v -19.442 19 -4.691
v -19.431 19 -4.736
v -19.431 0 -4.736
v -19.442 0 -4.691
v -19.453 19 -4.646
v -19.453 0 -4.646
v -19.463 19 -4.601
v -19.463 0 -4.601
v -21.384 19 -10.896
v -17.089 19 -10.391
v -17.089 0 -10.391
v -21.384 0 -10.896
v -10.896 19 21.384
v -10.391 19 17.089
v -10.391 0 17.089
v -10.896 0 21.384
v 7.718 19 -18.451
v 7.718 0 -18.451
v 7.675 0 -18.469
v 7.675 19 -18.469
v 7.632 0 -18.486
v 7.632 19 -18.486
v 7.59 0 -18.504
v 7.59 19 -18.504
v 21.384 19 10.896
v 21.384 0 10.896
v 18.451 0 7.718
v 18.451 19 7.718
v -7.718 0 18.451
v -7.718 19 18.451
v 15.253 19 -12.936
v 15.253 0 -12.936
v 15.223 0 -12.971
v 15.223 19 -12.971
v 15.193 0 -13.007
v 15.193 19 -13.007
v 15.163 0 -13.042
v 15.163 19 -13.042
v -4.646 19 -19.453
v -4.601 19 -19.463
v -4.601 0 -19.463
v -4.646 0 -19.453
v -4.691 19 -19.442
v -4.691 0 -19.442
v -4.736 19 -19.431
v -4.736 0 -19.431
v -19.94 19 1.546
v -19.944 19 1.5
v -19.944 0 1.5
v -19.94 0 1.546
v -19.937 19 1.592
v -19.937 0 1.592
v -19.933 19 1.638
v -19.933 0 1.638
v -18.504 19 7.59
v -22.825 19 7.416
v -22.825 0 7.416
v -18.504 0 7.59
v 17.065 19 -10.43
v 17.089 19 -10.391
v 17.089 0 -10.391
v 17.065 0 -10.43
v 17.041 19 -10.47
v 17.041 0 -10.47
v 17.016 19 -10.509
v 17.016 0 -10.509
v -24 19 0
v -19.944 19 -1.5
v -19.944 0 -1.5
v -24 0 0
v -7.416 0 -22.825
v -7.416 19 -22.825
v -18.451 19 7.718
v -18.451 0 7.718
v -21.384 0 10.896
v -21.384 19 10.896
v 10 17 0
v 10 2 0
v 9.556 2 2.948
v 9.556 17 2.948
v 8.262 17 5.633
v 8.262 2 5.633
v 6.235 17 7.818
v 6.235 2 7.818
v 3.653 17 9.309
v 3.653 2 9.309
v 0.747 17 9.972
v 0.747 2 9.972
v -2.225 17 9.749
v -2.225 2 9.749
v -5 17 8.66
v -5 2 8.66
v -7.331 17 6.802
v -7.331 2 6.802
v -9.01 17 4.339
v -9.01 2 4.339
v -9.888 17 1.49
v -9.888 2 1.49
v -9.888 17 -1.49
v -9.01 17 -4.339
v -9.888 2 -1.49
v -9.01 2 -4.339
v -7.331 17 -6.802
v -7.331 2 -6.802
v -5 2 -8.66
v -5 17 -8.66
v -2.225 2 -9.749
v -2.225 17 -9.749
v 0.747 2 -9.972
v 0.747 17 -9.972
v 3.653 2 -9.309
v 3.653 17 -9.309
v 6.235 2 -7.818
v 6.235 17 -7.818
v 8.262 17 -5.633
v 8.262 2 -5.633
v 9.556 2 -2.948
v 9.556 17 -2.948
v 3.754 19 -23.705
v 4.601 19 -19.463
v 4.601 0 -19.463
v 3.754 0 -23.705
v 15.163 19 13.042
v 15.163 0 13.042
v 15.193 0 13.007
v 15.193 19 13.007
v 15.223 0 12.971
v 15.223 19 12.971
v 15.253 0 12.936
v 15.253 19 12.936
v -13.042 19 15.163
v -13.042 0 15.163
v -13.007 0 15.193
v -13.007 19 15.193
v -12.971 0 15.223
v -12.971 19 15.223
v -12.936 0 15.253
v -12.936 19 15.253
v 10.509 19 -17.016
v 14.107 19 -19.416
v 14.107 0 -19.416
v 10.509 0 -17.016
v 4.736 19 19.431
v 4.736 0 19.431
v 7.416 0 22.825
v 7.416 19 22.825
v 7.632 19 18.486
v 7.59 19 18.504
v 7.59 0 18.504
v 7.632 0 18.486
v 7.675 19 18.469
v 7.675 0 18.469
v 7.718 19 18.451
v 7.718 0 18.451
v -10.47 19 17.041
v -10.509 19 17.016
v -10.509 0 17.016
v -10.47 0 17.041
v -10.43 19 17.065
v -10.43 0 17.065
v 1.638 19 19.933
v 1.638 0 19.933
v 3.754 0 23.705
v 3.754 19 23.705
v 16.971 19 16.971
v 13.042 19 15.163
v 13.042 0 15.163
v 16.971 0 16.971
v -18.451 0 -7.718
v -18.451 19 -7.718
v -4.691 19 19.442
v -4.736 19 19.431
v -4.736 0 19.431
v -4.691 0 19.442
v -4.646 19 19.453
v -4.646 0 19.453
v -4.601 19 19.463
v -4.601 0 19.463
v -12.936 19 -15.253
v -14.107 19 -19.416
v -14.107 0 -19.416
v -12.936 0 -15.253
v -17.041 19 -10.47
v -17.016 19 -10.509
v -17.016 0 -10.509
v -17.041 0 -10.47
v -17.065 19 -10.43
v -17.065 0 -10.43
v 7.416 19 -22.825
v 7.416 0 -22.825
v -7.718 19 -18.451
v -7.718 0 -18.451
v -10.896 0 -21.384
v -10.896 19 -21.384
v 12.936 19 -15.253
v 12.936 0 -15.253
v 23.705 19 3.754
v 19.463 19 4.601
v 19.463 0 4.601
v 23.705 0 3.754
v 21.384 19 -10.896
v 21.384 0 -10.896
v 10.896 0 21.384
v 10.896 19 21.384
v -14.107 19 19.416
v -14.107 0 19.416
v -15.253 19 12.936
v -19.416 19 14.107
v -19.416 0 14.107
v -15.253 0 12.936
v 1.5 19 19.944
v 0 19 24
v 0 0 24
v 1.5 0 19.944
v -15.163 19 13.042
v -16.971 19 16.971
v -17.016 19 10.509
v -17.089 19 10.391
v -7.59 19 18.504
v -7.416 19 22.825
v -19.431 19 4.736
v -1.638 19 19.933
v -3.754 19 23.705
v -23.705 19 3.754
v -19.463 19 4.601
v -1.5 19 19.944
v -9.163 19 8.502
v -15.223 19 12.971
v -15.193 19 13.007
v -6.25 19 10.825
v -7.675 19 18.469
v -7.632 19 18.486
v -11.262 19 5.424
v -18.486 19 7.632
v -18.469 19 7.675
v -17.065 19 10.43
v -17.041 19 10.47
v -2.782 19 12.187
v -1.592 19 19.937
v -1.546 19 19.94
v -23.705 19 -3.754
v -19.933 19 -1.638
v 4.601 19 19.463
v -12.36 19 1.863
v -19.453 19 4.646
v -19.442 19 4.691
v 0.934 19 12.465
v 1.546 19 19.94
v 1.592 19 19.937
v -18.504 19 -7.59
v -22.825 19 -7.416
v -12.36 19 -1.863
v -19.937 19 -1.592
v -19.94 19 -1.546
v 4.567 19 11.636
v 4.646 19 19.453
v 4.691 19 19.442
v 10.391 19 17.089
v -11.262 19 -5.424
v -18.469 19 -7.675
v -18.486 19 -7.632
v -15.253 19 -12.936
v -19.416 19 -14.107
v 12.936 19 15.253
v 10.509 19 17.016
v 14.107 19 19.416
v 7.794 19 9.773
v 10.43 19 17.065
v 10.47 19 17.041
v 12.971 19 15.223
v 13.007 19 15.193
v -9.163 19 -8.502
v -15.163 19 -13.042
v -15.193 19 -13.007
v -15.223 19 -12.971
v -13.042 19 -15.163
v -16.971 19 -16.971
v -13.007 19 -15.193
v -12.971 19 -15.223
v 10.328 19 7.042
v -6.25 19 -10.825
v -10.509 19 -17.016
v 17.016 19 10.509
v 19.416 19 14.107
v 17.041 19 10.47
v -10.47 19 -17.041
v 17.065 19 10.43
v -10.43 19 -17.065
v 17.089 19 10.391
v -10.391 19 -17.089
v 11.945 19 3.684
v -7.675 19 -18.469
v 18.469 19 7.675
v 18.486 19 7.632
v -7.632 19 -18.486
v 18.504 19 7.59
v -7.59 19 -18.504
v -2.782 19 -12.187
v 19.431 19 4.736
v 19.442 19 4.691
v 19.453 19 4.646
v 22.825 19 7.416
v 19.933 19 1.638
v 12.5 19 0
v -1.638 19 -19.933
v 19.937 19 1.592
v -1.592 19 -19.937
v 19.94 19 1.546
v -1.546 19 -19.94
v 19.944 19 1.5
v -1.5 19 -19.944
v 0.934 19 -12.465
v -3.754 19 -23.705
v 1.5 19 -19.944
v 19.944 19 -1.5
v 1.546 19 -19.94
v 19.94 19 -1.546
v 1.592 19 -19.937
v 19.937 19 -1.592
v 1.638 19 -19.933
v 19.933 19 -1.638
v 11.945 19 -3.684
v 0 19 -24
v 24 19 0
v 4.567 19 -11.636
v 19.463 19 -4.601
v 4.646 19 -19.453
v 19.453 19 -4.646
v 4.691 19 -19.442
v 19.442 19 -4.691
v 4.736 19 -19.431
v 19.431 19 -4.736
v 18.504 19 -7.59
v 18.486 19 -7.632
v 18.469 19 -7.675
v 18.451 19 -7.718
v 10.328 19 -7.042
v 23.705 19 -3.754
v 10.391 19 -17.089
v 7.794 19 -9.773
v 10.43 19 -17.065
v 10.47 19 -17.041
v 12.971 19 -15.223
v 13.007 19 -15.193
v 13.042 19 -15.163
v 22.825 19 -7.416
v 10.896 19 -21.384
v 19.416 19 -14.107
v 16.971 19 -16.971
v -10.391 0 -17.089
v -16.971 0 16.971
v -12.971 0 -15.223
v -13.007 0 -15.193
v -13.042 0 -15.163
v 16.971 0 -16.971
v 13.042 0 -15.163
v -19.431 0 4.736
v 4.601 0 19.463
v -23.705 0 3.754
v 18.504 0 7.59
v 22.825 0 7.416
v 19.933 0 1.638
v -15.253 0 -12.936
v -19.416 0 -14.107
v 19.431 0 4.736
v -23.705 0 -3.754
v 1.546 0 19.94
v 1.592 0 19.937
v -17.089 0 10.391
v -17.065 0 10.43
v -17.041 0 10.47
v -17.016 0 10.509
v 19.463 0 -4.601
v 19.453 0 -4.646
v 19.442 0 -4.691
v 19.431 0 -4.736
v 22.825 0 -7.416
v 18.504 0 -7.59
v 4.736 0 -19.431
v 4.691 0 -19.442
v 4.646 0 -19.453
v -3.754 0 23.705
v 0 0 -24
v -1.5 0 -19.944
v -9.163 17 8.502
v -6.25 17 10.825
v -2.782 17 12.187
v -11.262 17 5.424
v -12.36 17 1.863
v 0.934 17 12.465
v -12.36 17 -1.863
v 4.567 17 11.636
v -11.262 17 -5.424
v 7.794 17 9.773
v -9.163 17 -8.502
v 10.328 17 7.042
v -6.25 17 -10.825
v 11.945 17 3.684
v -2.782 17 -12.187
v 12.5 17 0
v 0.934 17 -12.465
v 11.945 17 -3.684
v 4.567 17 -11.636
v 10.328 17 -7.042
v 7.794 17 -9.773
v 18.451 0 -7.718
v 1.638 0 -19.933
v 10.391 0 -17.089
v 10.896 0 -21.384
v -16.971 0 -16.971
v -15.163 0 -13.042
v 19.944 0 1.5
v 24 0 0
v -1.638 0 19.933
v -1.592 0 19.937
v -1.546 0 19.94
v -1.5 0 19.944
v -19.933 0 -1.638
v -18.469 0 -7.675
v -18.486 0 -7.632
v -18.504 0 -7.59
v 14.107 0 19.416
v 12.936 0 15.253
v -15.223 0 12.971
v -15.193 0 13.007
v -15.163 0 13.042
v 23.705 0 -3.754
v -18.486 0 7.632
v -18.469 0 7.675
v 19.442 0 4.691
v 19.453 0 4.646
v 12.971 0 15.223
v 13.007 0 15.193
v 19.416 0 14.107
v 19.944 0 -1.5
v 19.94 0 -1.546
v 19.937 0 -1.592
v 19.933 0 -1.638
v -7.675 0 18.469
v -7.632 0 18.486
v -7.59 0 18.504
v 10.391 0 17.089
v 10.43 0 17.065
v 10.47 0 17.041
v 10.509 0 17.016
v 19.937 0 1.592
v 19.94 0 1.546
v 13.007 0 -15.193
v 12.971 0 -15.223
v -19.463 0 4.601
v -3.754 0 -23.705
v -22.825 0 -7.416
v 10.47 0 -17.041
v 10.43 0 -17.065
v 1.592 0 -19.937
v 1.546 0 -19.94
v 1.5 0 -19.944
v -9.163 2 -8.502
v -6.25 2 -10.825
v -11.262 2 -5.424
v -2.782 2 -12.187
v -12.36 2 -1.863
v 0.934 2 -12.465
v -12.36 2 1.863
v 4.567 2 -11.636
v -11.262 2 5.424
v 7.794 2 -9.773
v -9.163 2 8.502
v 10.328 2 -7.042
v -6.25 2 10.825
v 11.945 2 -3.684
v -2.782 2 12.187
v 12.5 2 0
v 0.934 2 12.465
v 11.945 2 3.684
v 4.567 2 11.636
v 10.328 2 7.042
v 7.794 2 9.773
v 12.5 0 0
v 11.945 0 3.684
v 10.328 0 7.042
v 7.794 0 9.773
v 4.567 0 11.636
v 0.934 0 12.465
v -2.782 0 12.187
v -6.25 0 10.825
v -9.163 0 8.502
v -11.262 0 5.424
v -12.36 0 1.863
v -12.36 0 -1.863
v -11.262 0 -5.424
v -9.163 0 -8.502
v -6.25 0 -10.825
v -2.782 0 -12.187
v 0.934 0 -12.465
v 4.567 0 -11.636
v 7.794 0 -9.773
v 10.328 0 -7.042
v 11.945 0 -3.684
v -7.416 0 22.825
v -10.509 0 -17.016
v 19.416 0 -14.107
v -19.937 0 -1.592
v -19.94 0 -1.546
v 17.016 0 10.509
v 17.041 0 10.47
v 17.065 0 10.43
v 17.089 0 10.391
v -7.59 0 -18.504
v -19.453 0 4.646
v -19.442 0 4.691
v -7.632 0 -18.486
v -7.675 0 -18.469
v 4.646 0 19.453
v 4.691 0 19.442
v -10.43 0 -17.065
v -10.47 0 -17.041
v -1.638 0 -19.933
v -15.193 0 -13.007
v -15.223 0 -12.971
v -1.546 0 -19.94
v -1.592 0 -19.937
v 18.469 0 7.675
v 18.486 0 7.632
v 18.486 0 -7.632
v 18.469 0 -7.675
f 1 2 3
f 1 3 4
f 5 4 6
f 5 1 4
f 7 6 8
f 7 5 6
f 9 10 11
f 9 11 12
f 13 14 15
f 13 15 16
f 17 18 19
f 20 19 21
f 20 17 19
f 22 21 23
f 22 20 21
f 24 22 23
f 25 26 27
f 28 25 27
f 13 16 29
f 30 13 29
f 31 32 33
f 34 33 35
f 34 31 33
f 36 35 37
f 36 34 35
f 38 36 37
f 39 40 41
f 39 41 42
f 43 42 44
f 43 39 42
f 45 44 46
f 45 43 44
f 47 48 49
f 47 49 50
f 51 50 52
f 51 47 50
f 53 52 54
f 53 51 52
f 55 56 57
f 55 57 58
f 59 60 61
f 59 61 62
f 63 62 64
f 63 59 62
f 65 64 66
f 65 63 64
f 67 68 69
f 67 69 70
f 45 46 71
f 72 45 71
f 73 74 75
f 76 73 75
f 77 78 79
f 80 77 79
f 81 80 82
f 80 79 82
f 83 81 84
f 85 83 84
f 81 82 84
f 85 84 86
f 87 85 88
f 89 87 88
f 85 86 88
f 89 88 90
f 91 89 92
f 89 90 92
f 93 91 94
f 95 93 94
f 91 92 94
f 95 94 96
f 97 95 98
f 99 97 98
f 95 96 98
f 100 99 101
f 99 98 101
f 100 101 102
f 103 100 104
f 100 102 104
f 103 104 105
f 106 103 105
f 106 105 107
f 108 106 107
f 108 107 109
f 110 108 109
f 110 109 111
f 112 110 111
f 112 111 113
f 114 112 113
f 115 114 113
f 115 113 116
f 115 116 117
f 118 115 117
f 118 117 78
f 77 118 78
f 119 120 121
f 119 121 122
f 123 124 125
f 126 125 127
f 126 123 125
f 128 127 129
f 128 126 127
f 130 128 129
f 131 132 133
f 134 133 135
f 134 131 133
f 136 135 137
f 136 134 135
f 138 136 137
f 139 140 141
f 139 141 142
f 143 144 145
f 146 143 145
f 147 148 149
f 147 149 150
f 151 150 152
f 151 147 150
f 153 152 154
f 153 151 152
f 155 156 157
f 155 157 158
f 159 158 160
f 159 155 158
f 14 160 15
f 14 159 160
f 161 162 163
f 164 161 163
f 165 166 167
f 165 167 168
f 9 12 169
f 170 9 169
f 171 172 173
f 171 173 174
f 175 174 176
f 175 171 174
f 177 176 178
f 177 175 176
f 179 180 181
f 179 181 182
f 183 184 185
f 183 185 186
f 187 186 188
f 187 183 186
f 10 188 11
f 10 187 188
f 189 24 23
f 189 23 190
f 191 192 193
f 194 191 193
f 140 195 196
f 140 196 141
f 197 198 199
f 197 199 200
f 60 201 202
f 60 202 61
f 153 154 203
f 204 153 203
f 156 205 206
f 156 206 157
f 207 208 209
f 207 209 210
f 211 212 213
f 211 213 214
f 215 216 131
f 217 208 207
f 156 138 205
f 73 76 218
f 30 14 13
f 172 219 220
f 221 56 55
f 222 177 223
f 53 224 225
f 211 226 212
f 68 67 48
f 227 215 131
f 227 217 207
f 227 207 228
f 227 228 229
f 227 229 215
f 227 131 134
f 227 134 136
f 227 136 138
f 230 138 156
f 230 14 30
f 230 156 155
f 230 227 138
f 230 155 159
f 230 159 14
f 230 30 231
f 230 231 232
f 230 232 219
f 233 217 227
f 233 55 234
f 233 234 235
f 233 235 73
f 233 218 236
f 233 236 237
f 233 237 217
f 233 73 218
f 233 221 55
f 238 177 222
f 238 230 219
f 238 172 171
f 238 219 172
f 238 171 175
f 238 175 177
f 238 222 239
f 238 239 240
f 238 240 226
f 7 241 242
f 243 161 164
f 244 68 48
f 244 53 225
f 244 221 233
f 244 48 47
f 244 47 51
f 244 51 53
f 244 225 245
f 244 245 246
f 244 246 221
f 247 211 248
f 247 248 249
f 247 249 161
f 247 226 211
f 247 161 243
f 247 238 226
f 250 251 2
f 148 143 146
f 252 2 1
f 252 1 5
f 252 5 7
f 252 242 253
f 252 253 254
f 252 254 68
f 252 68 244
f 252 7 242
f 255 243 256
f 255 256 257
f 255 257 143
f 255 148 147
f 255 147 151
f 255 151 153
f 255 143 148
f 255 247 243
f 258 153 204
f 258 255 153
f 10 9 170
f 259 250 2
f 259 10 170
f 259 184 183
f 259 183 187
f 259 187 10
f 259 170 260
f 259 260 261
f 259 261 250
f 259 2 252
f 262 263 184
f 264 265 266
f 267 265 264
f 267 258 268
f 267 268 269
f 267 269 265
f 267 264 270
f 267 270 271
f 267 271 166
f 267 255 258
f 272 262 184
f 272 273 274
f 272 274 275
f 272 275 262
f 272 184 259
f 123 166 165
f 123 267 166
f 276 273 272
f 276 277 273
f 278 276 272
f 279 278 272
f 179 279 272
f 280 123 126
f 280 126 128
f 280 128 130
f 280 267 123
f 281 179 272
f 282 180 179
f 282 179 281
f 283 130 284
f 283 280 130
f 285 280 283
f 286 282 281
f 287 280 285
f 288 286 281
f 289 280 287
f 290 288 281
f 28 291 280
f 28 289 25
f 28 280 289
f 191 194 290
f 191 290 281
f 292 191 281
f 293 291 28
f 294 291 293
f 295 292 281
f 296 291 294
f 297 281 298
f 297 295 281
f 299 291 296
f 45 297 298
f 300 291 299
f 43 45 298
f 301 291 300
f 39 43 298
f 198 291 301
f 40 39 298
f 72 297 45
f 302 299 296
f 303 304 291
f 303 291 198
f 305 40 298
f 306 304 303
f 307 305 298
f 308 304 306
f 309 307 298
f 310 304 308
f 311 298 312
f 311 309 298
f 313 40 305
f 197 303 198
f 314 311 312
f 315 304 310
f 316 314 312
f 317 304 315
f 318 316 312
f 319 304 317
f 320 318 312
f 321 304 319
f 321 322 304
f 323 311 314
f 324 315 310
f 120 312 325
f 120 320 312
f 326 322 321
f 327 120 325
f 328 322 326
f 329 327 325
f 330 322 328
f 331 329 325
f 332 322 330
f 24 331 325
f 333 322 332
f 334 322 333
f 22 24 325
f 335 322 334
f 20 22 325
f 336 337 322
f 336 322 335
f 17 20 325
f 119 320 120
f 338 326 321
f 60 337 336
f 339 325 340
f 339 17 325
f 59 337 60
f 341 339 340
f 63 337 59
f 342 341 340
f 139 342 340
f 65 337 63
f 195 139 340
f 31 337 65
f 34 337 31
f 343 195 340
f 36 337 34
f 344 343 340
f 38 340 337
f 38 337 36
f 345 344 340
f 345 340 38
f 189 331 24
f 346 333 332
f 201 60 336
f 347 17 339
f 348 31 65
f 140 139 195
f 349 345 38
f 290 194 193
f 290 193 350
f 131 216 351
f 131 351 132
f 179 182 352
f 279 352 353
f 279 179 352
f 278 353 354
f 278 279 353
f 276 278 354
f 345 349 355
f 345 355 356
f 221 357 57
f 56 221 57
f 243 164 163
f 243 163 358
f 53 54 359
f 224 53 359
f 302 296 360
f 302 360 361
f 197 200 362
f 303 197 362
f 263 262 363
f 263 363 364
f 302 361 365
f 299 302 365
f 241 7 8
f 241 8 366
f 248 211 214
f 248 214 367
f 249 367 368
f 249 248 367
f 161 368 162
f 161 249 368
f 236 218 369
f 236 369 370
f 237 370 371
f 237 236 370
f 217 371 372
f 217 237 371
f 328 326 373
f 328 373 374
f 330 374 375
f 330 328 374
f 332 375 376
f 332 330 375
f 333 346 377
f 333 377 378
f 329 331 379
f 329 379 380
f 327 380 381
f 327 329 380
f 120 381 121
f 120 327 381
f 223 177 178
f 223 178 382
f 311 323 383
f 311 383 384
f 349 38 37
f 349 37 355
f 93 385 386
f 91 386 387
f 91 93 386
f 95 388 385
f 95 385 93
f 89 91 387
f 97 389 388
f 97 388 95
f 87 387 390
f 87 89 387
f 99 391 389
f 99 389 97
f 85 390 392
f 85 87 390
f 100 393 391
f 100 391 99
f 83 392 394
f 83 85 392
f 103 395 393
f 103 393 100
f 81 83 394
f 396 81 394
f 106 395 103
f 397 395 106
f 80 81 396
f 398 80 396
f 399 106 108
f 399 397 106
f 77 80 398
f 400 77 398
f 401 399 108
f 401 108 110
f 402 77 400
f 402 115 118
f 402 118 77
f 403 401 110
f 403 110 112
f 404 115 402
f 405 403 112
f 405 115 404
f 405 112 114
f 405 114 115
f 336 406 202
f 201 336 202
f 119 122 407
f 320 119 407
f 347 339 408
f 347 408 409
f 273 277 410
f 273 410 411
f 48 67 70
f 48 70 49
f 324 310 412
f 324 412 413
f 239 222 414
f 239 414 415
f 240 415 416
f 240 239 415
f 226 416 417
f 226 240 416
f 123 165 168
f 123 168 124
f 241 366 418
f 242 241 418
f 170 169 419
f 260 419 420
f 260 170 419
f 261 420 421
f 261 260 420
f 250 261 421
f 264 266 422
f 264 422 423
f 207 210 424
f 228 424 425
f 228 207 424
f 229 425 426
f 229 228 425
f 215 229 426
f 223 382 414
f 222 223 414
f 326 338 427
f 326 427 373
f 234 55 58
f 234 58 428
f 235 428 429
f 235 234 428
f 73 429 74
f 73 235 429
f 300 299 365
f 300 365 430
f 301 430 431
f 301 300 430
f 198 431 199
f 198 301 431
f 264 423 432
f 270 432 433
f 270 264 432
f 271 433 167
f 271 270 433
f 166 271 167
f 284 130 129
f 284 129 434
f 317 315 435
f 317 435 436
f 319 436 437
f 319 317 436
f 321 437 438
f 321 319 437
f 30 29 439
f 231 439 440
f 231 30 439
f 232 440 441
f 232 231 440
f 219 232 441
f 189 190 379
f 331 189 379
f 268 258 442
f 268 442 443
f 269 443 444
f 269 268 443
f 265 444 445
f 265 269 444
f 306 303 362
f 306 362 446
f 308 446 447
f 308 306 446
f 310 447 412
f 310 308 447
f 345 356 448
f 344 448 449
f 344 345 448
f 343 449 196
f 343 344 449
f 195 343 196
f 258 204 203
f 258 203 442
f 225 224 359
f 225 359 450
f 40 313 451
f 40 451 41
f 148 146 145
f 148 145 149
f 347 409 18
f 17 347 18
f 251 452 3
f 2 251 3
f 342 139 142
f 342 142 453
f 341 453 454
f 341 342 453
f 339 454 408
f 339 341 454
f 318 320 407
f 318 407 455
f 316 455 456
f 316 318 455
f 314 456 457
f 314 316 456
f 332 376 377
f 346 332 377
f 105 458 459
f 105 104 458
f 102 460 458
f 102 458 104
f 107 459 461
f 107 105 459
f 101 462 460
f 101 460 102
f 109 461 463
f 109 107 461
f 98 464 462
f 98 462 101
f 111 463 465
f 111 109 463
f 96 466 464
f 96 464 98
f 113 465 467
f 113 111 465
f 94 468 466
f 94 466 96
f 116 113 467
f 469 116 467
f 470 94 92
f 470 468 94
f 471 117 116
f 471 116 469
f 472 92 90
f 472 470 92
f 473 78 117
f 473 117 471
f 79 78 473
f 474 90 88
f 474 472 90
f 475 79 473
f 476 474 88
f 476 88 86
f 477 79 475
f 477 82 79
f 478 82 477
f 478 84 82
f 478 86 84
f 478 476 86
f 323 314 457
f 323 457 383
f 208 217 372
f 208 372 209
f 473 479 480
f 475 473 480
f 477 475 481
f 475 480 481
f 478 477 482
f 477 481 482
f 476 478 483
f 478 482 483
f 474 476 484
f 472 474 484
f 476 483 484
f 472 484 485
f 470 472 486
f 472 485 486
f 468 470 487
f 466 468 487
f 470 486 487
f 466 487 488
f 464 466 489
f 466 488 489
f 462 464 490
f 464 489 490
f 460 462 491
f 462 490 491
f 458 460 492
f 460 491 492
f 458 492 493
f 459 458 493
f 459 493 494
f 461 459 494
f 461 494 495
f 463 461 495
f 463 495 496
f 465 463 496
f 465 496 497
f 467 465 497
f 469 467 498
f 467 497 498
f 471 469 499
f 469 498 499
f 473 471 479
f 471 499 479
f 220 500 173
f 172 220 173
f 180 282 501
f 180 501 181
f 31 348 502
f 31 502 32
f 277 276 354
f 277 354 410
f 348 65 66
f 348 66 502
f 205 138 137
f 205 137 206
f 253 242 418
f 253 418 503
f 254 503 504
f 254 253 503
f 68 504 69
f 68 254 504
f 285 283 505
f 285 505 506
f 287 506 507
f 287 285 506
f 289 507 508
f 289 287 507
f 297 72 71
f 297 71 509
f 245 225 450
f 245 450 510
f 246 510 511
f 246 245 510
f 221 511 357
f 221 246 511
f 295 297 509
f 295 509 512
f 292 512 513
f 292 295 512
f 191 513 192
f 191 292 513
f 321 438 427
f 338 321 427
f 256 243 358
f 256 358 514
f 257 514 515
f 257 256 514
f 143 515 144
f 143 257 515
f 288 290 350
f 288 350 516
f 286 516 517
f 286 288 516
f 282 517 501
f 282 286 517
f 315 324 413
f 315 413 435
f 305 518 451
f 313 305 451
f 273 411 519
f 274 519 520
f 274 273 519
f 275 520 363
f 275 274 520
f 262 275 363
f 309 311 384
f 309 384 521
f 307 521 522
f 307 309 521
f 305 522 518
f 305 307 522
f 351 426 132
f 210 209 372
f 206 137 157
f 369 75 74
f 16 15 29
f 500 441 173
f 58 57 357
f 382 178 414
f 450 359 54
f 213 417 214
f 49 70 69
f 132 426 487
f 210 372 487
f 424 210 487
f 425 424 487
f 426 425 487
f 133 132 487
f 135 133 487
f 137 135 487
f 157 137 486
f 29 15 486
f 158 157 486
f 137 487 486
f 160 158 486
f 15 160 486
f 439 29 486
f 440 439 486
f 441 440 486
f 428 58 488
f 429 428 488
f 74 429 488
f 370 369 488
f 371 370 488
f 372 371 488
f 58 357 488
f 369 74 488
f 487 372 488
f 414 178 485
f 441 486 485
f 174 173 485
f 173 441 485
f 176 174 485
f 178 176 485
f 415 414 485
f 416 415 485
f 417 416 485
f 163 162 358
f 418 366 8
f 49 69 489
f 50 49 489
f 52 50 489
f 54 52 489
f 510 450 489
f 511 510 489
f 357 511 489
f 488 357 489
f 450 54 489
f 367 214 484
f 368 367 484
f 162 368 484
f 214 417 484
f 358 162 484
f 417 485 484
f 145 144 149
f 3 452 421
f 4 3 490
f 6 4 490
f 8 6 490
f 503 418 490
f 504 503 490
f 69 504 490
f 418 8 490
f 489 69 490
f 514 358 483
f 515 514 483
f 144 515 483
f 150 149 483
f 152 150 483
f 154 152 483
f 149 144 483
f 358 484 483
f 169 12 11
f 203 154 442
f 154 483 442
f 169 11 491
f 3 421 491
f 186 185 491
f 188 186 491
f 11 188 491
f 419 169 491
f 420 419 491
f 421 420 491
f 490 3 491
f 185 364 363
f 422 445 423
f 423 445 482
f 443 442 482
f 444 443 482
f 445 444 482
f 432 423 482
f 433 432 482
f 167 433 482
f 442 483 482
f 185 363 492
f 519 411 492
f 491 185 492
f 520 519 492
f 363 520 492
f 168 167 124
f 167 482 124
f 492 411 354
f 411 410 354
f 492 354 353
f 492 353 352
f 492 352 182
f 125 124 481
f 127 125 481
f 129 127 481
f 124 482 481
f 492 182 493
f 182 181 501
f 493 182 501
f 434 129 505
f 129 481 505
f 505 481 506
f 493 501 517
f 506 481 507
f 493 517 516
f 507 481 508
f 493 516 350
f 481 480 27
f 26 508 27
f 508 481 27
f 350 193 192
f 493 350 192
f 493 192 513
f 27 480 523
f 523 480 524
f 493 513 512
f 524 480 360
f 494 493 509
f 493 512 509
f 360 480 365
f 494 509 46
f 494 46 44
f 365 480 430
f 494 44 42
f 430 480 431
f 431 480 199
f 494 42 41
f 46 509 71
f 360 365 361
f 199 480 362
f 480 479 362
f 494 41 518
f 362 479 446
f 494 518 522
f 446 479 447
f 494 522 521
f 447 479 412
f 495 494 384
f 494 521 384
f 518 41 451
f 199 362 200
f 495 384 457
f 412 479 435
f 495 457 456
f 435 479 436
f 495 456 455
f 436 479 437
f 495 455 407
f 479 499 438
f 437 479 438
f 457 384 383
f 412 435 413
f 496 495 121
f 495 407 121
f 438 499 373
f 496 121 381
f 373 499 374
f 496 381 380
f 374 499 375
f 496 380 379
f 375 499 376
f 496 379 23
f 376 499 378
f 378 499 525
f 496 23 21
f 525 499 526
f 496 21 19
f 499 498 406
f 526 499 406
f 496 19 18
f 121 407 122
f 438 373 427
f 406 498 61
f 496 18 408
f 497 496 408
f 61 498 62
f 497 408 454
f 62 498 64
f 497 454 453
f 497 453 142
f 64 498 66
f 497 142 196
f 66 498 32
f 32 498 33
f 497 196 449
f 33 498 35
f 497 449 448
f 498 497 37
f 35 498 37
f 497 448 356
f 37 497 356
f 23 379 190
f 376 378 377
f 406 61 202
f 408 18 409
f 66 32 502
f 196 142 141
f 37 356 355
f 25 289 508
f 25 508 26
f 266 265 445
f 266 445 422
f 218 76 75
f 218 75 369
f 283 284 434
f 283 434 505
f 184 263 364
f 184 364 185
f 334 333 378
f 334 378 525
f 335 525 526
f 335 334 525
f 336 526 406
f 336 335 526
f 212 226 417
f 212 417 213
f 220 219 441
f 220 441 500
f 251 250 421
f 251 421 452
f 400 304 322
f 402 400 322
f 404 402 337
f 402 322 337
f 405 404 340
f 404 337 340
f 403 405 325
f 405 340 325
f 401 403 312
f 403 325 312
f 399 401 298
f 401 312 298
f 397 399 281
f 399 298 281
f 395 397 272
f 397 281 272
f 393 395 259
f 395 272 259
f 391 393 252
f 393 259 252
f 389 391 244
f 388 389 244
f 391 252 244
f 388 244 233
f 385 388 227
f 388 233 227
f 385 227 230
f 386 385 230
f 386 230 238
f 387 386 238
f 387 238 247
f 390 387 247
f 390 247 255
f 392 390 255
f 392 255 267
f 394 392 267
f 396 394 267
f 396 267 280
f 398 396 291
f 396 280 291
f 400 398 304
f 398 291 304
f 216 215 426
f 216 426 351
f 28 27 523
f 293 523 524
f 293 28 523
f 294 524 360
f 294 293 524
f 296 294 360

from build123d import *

# Parameters (mm, degrees)
CROQUIS1_R              = 10
CROQUIS1_R_2            = 3
SALIENTE_EXTRUIR1_DEPTH = 19
CROQUIS2_R              = 10
SALIENTE_EXTRUIR2_DEPTH = 19
CROQUIS3_R              = 10
CORTAR_EXTRUIR1_DEPTH   = 20
CROQUIS4_R              = 12.5
CORTAR_EXTRUIR2_DEPTH   = 2
CROQUIS5_R              = 12.5
CORTAR_EXTRUIR3_DEPTH   = 2


with BuildPart() as part:
    # Croquis1 → Saliente-Extruir1 (new body)
    with BuildSketch(Plane(origin=(0, 0, 0), x_dir=(1, 0, 0), z_dir=(0, 1, 0))):
        Circle(CROQUIS1_R)
        Circle(CROQUIS1_R_2, mode=Mode.SUBTRACT)
    extrude(amount=SALIENTE_EXTRUIR1_DEPTH)

    # Croquis2 → Saliente-Extruir2 (add)
    with BuildSketch(Plane(origin=(0, 19, 0), x_dir=(1, 0, 0), z_dir=(0, 1, 0))):
        with BuildLine():
            Line((-1.5, -19.943670675), (0, -24))
            Line((0, -24), (1.5, -19.943670675))
            ThreePointArc((1.5, -19.943670675), (1.569181915, -19.938346675), (1.638344942, -19.932782692))
            Line((1.638344942, -19.932782692), (3.754427161, -23.704520174))
            Line((3.754427161, -23.704520174), (4.601409964, -19.463479297))
            ThreePointArc((4.601409964, -19.463479297), (4.668907277, -19.447398408), (4.736348394, -19.431083446))
            Line((4.736348394, -19.431083446), (7.416407865, -22.825356391))
            Line((7.416407865, -22.825356391), (7.589517943, -18.504032463))
            ThreePointArc((7.589517943, -18.504032463), (7.653668647, -18.47759065), (7.71772723, -18.450926437))
            Line((7.71772723, -18.450926437), (10.895771994, -21.384156581))
            Line((10.895771994, -21.384156581), (10.390746803, -17.088954938))
            ThreePointArc((10.390746803, -17.088954938), (10.449971294, -17.052803287), (10.509070008, -17.016446385))
            Line((10.509070008, -17.016446385), (14.106846055, -19.416407865))
            Line((14.106846055, -19.416407865), (12.936120991, -15.253090628))
            ThreePointArc((12.936120991, -15.253090628), (12.988960967, -15.208119312), (13.041644604, -15.162964948))
            Line((13.041644604, -15.162964948), (16.970562748, -16.970562748))
            Line((16.970562748, -16.970562748), (15.162964948, -13.041644604))
            ThreePointArc((15.162964948, -13.041644604), (15.208119312, -12.988960967), (15.253090628, -12.936120991))
            Line((15.253090628, -12.936120991), (19.416407865, -14.106846055))
            Line((19.416407865, -14.106846055), (17.016446385, -10.509070008))
            ThreePointArc((17.016446385, -10.509070008), (17.052803287, -10.449971294), (17.088954938, -10.390746803))
            Line((17.088954938, -10.390746803), (21.384156581, -10.895771994))
            Line((21.384156581, -10.895771994), (18.450926437, -7.71772723))
            ThreePointArc((18.450926437, -7.71772723), (18.47759065, -7.653668647), (18.504032463, -7.589517943))
            Line((18.504032463, -7.589517943), (22.825356391, -7.416407865))
            Line((22.825356391, -7.416407865), (19.431083446, -4.736348394))
            ThreePointArc((19.431083446, -4.736348394), (19.447398408, -4.668907277), (19.463479297, -4.601409964))
            Line((19.463479297, -4.601409964), (23.704520174, -3.754427161))
            Line((23.704520174, -3.754427161), (19.932782692, -1.638344942))
            ThreePointArc((19.932782692, -1.638344942), (19.938346675, -1.569181915), (19.943670675, -1.5))
            Line((19.943670675, -1.5), (24, 0))
            Line((24, 0), (19.943670675, 1.5))
            ThreePointArc((19.943670675, 1.5), (19.938346675, 1.569181915), (19.932782692, 1.638344942))
            Line((19.932782692, 1.638344942), (23.704520174, 3.754427161))
            Line((23.704520174, 3.754427161), (19.463479297, 4.601409964))
            ThreePointArc((19.463479297, 4.601409964), (19.447398408, 4.668907277), (19.431083446, 4.736348394))
            Line((19.431083446, 4.736348394), (22.825356391, 7.416407865))
            Line((22.825356391, 7.416407865), (18.504032463, 7.589517943))
            ThreePointArc((18.504032463, 7.589517943), (18.47759065, 7.653668647), (18.450926437, 7.71772723))
            Line((18.450926437, 7.71772723), (21.384156581, 10.895771994))
            Line((21.384156581, 10.895771994), (17.088954938, 10.390746803))
            ThreePointArc((17.088954938, 10.390746803), (17.052803287, 10.449971294), (17.016446385, 10.509070008))
            Line((17.016446385, 10.509070008), (19.416407865, 14.106846055))
            Line((19.416407865, 14.106846055), (15.253090628, 12.936120991))
            ThreePointArc((15.253090628, 12.936120991), (15.208119312, 12.988960967), (15.162964948, 13.041644604))
            Line((15.162964948, 13.041644604), (16.970562748, 16.970562748))
            Line((16.970562748, 16.970562748), (13.041644604, 15.162964948))
            ThreePointArc((13.041644604, 15.162964948), (12.988960967, 15.208119312), (12.936120991, 15.253090628))
            Line((12.936120991, 15.253090628), (14.106846055, 19.416407865))
            Line((14.106846055, 19.416407865), (10.509070008, 17.016446385))
            ThreePointArc((10.509070008, 17.016446385), (10.449971294, 17.052803287), (10.390746803, 17.088954938))
            Line((10.390746803, 17.088954938), (10.895771994, 21.384156581))
            Line((10.895771994, 21.384156581), (7.71772723, 18.450926437))
            ThreePointArc((7.71772723, 18.450926437), (7.653668647, 18.47759065), (7.589517943, 18.504032463))
            Line((7.589517943, 18.504032463), (7.416407865, 22.825356391))
            Line((7.416407865, 22.825356391), (4.736348394, 19.431083446))
            ThreePointArc((4.736348394, 19.431083446), (4.668907277, 19.447398408), (4.601409964, 19.463479297))
            Line((4.601409964, 19.463479297), (3.754427161, 23.704520174))
            Line((3.754427161, 23.704520174), (1.638344942, 19.932782692))
            ThreePointArc((1.638344942, 19.932782692), (1.569181915, 19.938346675), (1.5, 19.943670675))
            Line((1.5, 19.943670675), (0, 24))
            Line((0, 24), (-1.5, 19.943670675))
            ThreePointArc((-1.5, 19.943670675), (-1.569181915, 19.938346675), (-1.638344942, 19.932782692))
            Line((-1.638344942, 19.932782692), (-3.754427161, 23.704520174))
            Line((-3.754427161, 23.704520174), (-4.601409964, 19.463479297))
            ThreePointArc((-4.601409964, 19.463479297), (-4.668907277, 19.447398408), (-4.736348394, 19.431083446))
            Line((-4.736348394, 19.431083446), (-7.416407865, 22.825356391))
            Line((-7.416407865, 22.825356391), (-7.589517943, 18.504032463))
            ThreePointArc((-7.589517943, 18.504032463), (-7.653668647, 18.47759065), (-7.71772723, 18.450926437))
            Line((-7.71772723, 18.450926437), (-10.895771994, 21.384156581))
            Line((-10.895771994, 21.384156581), (-10.390746803, 17.088954938))
            ThreePointArc((-10.390746803, 17.088954938), (-10.449971294, 17.052803287), (-10.509070008, 17.016446385))
            Line((-10.509070008, 17.016446385), (-14.106846055, 19.416407865))
            Line((-14.106846055, 19.416407865), (-12.936120991, 15.253090628))
            ThreePointArc((-12.936120991, 15.253090628), (-12.988960967, 15.208119312), (-13.041644604, 15.162964948))
            Line((-13.041644604, 15.162964948), (-16.970562748, 16.970562748))
            Line((-16.970562748, 16.970562748), (-15.162964948, 13.041644604))
            ThreePointArc((-15.162964948, 13.041644604), (-15.208119312, 12.988960967), (-15.253090628, 12.936120991))
            Line((-15.253090628, 12.936120991), (-19.416407865, 14.106846055))
            Line((-19.416407865, 14.106846055), (-17.016446385, 10.509070008))
            ThreePointArc((-17.016446385, 10.509070008), (-17.052803287, 10.449971294), (-17.088954938, 10.390746803))
            Line((-17.088954938, 10.390746803), (-21.384156581, 10.895771994))
            Line((-21.384156581, 10.895771994), (-18.450926437, 7.71772723))
            ThreePointArc((-18.450926437, 7.71772723), (-18.47759065, 7.653668647), (-18.504032463, 7.589517943))
            Line((-18.504032463, 7.589517943), (-22.825356391, 7.416407865))
            Line((-22.825356391, 7.416407865), (-19.431083446, 4.736348394))
            ThreePointArc((-19.431083446, 4.736348394), (-19.447398408, 4.668907277), (-19.463479297, 4.601409964))
            Line((-19.463479297, 4.601409964), (-23.704520174, 3.754427161))
            Line((-23.704520174, 3.754427161), (-19.932782692, 1.638344942))
            ThreePointArc((-19.932782692, 1.638344942), (-19.938346675, 1.569181915), (-19.943670675, 1.5))
            Line((-19.943670675, 1.5), (-24, 0))
            Line((-24, 0), (-19.943670675, -1.5))
            ThreePointArc((-19.943670675, -1.5), (-19.938346675, -1.569181915), (-19.932782692, -1.638344942))
            Line((-19.932782692, -1.638344942), (-23.704520174, -3.754427161))
            Line((-23.704520174, -3.754427161), (-19.463479297, -4.601409964))
            ThreePointArc((-19.463479297, -4.601409964), (-19.447398408, -4.668907277), (-19.431083446, -4.736348394))
            Line((-19.431083446, -4.736348394), (-22.825356391, -7.416407865))
            Line((-22.825356391, -7.416407865), (-18.504032463, -7.589517943))
            ThreePointArc((-18.504032463, -7.589517943), (-18.47759065, -7.653668647), (-18.450926437, -7.71772723))
            Line((-18.450926437, -7.71772723), (-21.384156581, -10.895771994))
            Line((-21.384156581, -10.895771994), (-17.088954938, -10.390746803))
            ThreePointArc((-17.088954938, -10.390746803), (-17.052803287, -10.449971294), (-17.016446385, -10.509070008))
            Line((-17.016446385, -10.509070008), (-19.416407865, -14.106846055))
            Line((-19.416407865, -14.106846055), (-15.253090628, -12.936120991))
            ThreePointArc((-15.253090628, -12.936120991), (-15.208119312, -12.988960967), (-15.162964948, -13.041644604))
            Line((-15.162964948, -13.041644604), (-16.970562748, -16.970562748))
            Line((-16.970562748, -16.970562748), (-13.041644604, -15.162964948))
            ThreePointArc((-13.041644604, -15.162964948), (-12.988960967, -15.208119312), (-12.936120991, -15.253090628))
            Line((-12.936120991, -15.253090628), (-14.106846055, -19.416407865))
            Line((-14.106846055, -19.416407865), (-10.509070008, -17.016446385))
            ThreePointArc((-10.509070008, -17.016446385), (-10.449971294, -17.052803287), (-10.390746803, -17.088954938))
            Line((-10.390746803, -17.088954938), (-10.895771994, -21.384156581))
            Line((-10.895771994, -21.384156581), (-7.71772723, -18.450926437))
            ThreePointArc((-7.71772723, -18.450926437), (-7.653668647, -18.47759065), (-7.589517943, -18.504032463))
            Line((-7.589517943, -18.504032463), (-7.416407865, -22.825356391))
            Line((-7.416407865, -22.825356391), (-4.736348394, -19.431083446))
            ThreePointArc((-4.736348394, -19.431083446), (-4.668907277, -19.447398408), (-4.601409964, -19.463479297))
            Line((-4.601409964, -19.463479297), (-3.754427161, -23.704520174))
            Line((-3.754427161, -23.704520174), (-1.638344942, -19.932782692))
            ThreePointArc((-1.638344942, -19.932782692), (-1.569181915, -19.938346675), (-1.5, -19.943670675))
        make_face()
        Circle(CROQUIS2_R, mode=Mode.SUBTRACT)
    extrude(amount=-SALIENTE_EXTRUIR2_DEPTH)

    # Croquis3 → Cortar-Extruir1 (cut, through all)
    with BuildSketch(Plane.XZ):
        Circle(CROQUIS3_R)
    extrude(amount=-CORTAR_EXTRUIR1_DEPTH, mode=Mode.SUBTRACT)

    # Croquis4 → Cortar-Extruir2 (cut)
    with BuildSketch(Plane(origin=(0, 19, 0), x_dir=(1, 0, 0), z_dir=(0, 1, 0))):
        Circle(CROQUIS4_R)
    extrude(amount=-CORTAR_EXTRUIR2_DEPTH, mode=Mode.SUBTRACT)

    # Croquis5 → Cortar-Extruir3 (cut)
    with BuildSketch(Plane.XZ):
        Circle(CROQUIS5_R)
    extrude(amount=-CORTAR_EXTRUIR3_DEPTH, mode=Mode.SUBTRACT)


solid = part.part
